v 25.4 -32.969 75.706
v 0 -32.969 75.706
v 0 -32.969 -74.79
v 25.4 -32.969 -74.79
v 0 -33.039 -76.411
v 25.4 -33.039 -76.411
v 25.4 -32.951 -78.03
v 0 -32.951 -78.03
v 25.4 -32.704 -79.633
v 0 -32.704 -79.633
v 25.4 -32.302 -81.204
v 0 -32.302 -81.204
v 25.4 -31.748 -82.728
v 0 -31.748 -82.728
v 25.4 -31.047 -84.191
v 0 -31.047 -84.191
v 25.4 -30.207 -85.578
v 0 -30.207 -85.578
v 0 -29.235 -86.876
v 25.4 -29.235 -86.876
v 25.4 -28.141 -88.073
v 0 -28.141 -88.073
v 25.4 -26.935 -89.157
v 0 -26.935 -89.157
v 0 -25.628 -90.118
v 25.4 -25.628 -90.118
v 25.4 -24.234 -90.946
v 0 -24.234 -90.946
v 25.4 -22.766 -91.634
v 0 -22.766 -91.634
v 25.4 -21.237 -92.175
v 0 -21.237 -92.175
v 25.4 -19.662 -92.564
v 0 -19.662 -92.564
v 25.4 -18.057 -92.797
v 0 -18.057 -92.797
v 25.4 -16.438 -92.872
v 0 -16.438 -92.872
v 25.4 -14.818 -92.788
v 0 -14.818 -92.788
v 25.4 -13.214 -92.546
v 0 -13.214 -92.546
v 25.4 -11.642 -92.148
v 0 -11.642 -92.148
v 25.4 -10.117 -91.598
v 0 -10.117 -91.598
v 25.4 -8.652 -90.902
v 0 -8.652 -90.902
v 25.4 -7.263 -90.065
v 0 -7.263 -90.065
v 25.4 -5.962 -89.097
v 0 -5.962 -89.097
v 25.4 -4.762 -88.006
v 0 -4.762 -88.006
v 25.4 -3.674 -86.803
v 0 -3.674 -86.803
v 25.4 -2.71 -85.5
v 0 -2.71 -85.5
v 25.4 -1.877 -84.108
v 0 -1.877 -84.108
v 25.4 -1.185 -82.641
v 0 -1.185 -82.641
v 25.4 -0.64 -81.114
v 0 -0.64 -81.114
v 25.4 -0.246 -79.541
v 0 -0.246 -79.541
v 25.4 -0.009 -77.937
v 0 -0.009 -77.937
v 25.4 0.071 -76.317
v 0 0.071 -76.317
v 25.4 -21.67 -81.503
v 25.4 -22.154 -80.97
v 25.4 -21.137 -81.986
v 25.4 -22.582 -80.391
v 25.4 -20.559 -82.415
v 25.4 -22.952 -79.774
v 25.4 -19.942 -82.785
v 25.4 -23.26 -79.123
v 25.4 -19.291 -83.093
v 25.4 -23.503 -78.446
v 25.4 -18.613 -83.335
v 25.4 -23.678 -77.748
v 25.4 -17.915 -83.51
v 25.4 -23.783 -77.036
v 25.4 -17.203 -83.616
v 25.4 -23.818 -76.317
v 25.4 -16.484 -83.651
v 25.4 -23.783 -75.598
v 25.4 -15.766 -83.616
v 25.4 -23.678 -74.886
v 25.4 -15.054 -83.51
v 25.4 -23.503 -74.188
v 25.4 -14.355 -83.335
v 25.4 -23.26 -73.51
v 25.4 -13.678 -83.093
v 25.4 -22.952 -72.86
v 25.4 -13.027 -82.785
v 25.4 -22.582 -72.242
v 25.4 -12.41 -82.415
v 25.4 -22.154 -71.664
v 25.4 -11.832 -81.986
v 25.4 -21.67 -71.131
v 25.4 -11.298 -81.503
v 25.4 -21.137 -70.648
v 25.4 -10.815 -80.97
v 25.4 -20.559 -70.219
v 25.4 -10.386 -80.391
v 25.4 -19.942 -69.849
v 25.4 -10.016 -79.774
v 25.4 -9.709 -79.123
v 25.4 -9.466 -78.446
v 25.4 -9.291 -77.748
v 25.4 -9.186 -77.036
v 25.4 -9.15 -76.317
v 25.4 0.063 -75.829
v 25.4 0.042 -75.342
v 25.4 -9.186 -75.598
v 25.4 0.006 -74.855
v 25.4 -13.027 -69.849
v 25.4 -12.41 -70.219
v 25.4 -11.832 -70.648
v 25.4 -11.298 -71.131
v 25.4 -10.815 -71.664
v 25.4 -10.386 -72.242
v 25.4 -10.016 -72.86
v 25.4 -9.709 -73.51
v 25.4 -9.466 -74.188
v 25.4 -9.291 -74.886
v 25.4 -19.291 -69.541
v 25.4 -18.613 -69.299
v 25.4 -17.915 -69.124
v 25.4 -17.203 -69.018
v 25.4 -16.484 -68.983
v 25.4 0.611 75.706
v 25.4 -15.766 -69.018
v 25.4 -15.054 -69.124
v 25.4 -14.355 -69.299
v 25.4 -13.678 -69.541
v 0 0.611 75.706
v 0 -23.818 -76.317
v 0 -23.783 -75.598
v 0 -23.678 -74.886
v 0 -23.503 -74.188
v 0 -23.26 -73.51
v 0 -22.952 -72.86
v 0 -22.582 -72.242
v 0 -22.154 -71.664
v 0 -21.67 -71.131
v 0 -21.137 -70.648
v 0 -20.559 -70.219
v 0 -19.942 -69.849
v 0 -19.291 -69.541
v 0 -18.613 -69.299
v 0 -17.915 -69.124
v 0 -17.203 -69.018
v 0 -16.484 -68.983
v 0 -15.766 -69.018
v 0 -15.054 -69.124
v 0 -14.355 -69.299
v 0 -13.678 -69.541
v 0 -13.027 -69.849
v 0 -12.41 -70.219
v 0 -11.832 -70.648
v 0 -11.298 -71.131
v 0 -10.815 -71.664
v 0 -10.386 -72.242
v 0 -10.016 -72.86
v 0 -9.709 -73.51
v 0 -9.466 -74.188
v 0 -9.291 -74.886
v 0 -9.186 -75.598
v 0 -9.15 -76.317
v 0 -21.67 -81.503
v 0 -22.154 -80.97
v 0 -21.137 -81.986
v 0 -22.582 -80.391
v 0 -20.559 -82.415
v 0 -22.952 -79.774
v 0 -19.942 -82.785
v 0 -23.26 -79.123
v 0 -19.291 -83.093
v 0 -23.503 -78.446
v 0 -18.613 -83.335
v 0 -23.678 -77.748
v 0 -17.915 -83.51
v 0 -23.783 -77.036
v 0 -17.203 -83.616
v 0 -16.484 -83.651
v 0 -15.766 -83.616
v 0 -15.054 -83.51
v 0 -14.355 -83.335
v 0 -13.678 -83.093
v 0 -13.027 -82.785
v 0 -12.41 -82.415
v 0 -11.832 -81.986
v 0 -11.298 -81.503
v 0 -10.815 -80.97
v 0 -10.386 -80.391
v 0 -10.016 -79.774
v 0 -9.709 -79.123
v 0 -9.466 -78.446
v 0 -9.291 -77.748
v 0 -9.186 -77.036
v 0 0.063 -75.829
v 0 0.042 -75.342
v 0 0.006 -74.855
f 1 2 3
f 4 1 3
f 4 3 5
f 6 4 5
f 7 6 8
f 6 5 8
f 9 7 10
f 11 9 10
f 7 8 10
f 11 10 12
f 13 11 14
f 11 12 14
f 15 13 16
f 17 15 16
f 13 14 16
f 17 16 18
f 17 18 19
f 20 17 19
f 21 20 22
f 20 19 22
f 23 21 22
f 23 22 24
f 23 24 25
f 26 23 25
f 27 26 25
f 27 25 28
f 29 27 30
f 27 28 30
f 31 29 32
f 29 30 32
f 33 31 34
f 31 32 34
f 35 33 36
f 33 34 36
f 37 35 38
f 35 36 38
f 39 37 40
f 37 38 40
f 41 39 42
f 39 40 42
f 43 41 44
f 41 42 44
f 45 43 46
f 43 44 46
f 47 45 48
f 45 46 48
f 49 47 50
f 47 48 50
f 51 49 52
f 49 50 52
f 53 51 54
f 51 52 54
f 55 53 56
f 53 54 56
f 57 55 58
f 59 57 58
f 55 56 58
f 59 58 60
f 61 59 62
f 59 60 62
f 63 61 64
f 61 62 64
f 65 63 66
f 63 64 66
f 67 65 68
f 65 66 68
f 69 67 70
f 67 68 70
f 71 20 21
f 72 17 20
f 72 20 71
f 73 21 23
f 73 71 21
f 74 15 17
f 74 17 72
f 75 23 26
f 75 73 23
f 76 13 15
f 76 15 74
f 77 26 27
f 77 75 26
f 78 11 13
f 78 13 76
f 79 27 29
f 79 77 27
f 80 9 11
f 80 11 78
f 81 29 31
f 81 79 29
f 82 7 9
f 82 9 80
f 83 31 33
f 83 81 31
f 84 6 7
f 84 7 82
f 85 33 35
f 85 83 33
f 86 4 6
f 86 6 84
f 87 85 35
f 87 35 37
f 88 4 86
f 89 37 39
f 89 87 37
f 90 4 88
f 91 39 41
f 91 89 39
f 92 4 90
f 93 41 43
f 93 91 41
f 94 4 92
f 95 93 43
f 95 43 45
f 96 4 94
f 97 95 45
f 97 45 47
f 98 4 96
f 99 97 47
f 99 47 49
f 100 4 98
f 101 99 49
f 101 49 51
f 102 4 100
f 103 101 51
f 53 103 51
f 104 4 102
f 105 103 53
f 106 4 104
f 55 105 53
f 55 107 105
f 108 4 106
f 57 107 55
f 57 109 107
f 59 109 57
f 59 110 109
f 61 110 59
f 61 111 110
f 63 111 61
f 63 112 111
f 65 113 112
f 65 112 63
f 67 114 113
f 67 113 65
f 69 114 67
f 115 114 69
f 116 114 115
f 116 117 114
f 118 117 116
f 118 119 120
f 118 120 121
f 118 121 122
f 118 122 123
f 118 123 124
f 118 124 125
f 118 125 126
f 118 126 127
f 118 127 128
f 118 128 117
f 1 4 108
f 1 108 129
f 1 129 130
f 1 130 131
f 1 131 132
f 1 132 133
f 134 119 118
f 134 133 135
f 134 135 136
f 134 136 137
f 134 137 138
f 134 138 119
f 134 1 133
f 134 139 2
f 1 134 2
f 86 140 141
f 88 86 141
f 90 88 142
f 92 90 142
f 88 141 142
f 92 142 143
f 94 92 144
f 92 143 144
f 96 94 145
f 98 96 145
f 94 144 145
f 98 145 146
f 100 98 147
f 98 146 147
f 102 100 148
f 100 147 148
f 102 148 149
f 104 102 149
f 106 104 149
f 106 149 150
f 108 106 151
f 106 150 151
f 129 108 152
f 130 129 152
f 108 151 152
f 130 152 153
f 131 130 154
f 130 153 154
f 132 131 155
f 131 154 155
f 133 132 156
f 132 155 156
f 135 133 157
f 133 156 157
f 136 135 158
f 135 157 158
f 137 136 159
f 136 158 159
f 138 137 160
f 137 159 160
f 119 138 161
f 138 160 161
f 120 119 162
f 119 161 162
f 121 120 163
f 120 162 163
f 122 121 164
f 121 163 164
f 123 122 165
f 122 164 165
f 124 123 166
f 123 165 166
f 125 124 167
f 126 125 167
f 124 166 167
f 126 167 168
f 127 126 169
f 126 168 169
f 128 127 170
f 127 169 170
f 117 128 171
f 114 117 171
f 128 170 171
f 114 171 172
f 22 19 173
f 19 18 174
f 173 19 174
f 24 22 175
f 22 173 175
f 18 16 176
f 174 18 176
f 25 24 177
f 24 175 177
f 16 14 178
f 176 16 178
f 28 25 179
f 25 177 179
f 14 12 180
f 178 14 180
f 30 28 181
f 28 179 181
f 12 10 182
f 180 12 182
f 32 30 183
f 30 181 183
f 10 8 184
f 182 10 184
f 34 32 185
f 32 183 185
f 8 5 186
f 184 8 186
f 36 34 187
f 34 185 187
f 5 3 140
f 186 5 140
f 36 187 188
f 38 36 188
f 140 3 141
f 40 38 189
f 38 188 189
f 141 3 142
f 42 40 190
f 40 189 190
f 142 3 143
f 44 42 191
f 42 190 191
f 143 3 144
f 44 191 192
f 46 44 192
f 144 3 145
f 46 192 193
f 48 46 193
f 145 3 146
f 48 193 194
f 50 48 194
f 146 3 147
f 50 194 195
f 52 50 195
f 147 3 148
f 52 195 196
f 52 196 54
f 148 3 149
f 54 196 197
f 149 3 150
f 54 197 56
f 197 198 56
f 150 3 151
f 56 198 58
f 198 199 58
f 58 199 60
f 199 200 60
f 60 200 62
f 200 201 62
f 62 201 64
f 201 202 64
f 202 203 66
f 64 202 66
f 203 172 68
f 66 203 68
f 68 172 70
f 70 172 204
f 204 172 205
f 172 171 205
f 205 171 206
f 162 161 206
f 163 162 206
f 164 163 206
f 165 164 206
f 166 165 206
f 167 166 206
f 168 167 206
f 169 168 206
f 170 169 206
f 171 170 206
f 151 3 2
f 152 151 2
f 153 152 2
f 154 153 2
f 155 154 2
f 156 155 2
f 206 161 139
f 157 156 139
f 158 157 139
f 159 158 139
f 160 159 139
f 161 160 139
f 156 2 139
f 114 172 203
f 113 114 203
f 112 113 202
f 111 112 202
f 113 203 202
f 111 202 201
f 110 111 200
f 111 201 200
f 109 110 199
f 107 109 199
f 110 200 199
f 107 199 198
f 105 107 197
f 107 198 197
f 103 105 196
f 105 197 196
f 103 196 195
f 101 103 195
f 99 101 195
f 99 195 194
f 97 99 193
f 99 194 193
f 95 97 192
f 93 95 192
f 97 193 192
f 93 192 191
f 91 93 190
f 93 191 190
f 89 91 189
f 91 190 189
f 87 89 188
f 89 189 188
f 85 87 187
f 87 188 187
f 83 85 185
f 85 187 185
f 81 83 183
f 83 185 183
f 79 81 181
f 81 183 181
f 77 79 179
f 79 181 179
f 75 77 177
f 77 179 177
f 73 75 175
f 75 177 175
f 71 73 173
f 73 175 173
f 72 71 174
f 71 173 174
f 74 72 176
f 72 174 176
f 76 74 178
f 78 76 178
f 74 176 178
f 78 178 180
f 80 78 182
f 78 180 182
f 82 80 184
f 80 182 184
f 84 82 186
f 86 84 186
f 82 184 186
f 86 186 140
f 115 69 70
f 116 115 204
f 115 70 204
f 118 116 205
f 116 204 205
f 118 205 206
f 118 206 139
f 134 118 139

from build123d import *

# Parameters (mm, degrees)
F1_DEPTH = 25.4


with BuildPart() as f1:
    # F0 (on Right) → F1 (new body)
    with BuildSketch(Plane.YZ):
        with BuildLine():
            ThreePointArc((-32.9688712955, -74.7904999055), (-16.4519134228, -59.7619169827), (0.0058700323, -74.8552786289))
            Line((0.0058700323, -74.8552786289), (0.610534451, 75.7063031197))
            Line((0.610534451, 75.7063031197), (-32.9688712955, 75.7063031197))
            Line((-32.9688712955, 75.7063031197), (-32.9688712955, -74.7904999055))
        make_face()
        with BuildLine():
            Line((-9.1503931598, -76.3168334961), (3.395e-07, -76.3168334961))
            Line((3.395e-07, -76.3168334961), (0.0058700323, -74.8552786289))
            ThreePointArc((0.0058700323, -74.8552786289), (-16.4519134228, -59.7619169827), (-32.9688712955, -74.7904999055))
            Line((-32.9688712955, -74.7904999055), (-32.9688712955, -76.3168334961))
            Line((-32.9688712955, -76.3168334961), (-23.8184777961, -76.3168334961))
            ThreePointArc((-23.8184777961, -76.3168334961), (-16.484435478, -68.982791178), (-9.1503931598, -76.3168334961))
        make_face()
        with BuildLine():
            Line((0.0058700323, -74.8552786289), (3.395e-07, -76.3168334961))
            Line((3.395e-07, -76.3168334961), (-9.1503931598, -76.3168334961))
            ThreePointArc((-9.1503931598, -76.3168334961), (-16.484435478, -83.6508758142), (-23.8184777961, -76.3168334961))
            Line((-23.8184777961, -76.3168334961), (-32.9688712955, -76.3168334961))
            Line((-32.9688712955, -76.3168334961), (-32.9688712955, -74.7904999055))
            ThreePointArc((-32.9688712955, -74.7904999055), (-17.2484162143, -92.8541443986), (0.0705129802, -76.3168334961))
            ThreePointArc((0.0705129802, -76.3168334961), (0.0543443475, -75.5853416403), (0.0058700323, -74.8552786289))
        make_face()
    extrude(amount=F1_DEPTH)


solid = f1.part
